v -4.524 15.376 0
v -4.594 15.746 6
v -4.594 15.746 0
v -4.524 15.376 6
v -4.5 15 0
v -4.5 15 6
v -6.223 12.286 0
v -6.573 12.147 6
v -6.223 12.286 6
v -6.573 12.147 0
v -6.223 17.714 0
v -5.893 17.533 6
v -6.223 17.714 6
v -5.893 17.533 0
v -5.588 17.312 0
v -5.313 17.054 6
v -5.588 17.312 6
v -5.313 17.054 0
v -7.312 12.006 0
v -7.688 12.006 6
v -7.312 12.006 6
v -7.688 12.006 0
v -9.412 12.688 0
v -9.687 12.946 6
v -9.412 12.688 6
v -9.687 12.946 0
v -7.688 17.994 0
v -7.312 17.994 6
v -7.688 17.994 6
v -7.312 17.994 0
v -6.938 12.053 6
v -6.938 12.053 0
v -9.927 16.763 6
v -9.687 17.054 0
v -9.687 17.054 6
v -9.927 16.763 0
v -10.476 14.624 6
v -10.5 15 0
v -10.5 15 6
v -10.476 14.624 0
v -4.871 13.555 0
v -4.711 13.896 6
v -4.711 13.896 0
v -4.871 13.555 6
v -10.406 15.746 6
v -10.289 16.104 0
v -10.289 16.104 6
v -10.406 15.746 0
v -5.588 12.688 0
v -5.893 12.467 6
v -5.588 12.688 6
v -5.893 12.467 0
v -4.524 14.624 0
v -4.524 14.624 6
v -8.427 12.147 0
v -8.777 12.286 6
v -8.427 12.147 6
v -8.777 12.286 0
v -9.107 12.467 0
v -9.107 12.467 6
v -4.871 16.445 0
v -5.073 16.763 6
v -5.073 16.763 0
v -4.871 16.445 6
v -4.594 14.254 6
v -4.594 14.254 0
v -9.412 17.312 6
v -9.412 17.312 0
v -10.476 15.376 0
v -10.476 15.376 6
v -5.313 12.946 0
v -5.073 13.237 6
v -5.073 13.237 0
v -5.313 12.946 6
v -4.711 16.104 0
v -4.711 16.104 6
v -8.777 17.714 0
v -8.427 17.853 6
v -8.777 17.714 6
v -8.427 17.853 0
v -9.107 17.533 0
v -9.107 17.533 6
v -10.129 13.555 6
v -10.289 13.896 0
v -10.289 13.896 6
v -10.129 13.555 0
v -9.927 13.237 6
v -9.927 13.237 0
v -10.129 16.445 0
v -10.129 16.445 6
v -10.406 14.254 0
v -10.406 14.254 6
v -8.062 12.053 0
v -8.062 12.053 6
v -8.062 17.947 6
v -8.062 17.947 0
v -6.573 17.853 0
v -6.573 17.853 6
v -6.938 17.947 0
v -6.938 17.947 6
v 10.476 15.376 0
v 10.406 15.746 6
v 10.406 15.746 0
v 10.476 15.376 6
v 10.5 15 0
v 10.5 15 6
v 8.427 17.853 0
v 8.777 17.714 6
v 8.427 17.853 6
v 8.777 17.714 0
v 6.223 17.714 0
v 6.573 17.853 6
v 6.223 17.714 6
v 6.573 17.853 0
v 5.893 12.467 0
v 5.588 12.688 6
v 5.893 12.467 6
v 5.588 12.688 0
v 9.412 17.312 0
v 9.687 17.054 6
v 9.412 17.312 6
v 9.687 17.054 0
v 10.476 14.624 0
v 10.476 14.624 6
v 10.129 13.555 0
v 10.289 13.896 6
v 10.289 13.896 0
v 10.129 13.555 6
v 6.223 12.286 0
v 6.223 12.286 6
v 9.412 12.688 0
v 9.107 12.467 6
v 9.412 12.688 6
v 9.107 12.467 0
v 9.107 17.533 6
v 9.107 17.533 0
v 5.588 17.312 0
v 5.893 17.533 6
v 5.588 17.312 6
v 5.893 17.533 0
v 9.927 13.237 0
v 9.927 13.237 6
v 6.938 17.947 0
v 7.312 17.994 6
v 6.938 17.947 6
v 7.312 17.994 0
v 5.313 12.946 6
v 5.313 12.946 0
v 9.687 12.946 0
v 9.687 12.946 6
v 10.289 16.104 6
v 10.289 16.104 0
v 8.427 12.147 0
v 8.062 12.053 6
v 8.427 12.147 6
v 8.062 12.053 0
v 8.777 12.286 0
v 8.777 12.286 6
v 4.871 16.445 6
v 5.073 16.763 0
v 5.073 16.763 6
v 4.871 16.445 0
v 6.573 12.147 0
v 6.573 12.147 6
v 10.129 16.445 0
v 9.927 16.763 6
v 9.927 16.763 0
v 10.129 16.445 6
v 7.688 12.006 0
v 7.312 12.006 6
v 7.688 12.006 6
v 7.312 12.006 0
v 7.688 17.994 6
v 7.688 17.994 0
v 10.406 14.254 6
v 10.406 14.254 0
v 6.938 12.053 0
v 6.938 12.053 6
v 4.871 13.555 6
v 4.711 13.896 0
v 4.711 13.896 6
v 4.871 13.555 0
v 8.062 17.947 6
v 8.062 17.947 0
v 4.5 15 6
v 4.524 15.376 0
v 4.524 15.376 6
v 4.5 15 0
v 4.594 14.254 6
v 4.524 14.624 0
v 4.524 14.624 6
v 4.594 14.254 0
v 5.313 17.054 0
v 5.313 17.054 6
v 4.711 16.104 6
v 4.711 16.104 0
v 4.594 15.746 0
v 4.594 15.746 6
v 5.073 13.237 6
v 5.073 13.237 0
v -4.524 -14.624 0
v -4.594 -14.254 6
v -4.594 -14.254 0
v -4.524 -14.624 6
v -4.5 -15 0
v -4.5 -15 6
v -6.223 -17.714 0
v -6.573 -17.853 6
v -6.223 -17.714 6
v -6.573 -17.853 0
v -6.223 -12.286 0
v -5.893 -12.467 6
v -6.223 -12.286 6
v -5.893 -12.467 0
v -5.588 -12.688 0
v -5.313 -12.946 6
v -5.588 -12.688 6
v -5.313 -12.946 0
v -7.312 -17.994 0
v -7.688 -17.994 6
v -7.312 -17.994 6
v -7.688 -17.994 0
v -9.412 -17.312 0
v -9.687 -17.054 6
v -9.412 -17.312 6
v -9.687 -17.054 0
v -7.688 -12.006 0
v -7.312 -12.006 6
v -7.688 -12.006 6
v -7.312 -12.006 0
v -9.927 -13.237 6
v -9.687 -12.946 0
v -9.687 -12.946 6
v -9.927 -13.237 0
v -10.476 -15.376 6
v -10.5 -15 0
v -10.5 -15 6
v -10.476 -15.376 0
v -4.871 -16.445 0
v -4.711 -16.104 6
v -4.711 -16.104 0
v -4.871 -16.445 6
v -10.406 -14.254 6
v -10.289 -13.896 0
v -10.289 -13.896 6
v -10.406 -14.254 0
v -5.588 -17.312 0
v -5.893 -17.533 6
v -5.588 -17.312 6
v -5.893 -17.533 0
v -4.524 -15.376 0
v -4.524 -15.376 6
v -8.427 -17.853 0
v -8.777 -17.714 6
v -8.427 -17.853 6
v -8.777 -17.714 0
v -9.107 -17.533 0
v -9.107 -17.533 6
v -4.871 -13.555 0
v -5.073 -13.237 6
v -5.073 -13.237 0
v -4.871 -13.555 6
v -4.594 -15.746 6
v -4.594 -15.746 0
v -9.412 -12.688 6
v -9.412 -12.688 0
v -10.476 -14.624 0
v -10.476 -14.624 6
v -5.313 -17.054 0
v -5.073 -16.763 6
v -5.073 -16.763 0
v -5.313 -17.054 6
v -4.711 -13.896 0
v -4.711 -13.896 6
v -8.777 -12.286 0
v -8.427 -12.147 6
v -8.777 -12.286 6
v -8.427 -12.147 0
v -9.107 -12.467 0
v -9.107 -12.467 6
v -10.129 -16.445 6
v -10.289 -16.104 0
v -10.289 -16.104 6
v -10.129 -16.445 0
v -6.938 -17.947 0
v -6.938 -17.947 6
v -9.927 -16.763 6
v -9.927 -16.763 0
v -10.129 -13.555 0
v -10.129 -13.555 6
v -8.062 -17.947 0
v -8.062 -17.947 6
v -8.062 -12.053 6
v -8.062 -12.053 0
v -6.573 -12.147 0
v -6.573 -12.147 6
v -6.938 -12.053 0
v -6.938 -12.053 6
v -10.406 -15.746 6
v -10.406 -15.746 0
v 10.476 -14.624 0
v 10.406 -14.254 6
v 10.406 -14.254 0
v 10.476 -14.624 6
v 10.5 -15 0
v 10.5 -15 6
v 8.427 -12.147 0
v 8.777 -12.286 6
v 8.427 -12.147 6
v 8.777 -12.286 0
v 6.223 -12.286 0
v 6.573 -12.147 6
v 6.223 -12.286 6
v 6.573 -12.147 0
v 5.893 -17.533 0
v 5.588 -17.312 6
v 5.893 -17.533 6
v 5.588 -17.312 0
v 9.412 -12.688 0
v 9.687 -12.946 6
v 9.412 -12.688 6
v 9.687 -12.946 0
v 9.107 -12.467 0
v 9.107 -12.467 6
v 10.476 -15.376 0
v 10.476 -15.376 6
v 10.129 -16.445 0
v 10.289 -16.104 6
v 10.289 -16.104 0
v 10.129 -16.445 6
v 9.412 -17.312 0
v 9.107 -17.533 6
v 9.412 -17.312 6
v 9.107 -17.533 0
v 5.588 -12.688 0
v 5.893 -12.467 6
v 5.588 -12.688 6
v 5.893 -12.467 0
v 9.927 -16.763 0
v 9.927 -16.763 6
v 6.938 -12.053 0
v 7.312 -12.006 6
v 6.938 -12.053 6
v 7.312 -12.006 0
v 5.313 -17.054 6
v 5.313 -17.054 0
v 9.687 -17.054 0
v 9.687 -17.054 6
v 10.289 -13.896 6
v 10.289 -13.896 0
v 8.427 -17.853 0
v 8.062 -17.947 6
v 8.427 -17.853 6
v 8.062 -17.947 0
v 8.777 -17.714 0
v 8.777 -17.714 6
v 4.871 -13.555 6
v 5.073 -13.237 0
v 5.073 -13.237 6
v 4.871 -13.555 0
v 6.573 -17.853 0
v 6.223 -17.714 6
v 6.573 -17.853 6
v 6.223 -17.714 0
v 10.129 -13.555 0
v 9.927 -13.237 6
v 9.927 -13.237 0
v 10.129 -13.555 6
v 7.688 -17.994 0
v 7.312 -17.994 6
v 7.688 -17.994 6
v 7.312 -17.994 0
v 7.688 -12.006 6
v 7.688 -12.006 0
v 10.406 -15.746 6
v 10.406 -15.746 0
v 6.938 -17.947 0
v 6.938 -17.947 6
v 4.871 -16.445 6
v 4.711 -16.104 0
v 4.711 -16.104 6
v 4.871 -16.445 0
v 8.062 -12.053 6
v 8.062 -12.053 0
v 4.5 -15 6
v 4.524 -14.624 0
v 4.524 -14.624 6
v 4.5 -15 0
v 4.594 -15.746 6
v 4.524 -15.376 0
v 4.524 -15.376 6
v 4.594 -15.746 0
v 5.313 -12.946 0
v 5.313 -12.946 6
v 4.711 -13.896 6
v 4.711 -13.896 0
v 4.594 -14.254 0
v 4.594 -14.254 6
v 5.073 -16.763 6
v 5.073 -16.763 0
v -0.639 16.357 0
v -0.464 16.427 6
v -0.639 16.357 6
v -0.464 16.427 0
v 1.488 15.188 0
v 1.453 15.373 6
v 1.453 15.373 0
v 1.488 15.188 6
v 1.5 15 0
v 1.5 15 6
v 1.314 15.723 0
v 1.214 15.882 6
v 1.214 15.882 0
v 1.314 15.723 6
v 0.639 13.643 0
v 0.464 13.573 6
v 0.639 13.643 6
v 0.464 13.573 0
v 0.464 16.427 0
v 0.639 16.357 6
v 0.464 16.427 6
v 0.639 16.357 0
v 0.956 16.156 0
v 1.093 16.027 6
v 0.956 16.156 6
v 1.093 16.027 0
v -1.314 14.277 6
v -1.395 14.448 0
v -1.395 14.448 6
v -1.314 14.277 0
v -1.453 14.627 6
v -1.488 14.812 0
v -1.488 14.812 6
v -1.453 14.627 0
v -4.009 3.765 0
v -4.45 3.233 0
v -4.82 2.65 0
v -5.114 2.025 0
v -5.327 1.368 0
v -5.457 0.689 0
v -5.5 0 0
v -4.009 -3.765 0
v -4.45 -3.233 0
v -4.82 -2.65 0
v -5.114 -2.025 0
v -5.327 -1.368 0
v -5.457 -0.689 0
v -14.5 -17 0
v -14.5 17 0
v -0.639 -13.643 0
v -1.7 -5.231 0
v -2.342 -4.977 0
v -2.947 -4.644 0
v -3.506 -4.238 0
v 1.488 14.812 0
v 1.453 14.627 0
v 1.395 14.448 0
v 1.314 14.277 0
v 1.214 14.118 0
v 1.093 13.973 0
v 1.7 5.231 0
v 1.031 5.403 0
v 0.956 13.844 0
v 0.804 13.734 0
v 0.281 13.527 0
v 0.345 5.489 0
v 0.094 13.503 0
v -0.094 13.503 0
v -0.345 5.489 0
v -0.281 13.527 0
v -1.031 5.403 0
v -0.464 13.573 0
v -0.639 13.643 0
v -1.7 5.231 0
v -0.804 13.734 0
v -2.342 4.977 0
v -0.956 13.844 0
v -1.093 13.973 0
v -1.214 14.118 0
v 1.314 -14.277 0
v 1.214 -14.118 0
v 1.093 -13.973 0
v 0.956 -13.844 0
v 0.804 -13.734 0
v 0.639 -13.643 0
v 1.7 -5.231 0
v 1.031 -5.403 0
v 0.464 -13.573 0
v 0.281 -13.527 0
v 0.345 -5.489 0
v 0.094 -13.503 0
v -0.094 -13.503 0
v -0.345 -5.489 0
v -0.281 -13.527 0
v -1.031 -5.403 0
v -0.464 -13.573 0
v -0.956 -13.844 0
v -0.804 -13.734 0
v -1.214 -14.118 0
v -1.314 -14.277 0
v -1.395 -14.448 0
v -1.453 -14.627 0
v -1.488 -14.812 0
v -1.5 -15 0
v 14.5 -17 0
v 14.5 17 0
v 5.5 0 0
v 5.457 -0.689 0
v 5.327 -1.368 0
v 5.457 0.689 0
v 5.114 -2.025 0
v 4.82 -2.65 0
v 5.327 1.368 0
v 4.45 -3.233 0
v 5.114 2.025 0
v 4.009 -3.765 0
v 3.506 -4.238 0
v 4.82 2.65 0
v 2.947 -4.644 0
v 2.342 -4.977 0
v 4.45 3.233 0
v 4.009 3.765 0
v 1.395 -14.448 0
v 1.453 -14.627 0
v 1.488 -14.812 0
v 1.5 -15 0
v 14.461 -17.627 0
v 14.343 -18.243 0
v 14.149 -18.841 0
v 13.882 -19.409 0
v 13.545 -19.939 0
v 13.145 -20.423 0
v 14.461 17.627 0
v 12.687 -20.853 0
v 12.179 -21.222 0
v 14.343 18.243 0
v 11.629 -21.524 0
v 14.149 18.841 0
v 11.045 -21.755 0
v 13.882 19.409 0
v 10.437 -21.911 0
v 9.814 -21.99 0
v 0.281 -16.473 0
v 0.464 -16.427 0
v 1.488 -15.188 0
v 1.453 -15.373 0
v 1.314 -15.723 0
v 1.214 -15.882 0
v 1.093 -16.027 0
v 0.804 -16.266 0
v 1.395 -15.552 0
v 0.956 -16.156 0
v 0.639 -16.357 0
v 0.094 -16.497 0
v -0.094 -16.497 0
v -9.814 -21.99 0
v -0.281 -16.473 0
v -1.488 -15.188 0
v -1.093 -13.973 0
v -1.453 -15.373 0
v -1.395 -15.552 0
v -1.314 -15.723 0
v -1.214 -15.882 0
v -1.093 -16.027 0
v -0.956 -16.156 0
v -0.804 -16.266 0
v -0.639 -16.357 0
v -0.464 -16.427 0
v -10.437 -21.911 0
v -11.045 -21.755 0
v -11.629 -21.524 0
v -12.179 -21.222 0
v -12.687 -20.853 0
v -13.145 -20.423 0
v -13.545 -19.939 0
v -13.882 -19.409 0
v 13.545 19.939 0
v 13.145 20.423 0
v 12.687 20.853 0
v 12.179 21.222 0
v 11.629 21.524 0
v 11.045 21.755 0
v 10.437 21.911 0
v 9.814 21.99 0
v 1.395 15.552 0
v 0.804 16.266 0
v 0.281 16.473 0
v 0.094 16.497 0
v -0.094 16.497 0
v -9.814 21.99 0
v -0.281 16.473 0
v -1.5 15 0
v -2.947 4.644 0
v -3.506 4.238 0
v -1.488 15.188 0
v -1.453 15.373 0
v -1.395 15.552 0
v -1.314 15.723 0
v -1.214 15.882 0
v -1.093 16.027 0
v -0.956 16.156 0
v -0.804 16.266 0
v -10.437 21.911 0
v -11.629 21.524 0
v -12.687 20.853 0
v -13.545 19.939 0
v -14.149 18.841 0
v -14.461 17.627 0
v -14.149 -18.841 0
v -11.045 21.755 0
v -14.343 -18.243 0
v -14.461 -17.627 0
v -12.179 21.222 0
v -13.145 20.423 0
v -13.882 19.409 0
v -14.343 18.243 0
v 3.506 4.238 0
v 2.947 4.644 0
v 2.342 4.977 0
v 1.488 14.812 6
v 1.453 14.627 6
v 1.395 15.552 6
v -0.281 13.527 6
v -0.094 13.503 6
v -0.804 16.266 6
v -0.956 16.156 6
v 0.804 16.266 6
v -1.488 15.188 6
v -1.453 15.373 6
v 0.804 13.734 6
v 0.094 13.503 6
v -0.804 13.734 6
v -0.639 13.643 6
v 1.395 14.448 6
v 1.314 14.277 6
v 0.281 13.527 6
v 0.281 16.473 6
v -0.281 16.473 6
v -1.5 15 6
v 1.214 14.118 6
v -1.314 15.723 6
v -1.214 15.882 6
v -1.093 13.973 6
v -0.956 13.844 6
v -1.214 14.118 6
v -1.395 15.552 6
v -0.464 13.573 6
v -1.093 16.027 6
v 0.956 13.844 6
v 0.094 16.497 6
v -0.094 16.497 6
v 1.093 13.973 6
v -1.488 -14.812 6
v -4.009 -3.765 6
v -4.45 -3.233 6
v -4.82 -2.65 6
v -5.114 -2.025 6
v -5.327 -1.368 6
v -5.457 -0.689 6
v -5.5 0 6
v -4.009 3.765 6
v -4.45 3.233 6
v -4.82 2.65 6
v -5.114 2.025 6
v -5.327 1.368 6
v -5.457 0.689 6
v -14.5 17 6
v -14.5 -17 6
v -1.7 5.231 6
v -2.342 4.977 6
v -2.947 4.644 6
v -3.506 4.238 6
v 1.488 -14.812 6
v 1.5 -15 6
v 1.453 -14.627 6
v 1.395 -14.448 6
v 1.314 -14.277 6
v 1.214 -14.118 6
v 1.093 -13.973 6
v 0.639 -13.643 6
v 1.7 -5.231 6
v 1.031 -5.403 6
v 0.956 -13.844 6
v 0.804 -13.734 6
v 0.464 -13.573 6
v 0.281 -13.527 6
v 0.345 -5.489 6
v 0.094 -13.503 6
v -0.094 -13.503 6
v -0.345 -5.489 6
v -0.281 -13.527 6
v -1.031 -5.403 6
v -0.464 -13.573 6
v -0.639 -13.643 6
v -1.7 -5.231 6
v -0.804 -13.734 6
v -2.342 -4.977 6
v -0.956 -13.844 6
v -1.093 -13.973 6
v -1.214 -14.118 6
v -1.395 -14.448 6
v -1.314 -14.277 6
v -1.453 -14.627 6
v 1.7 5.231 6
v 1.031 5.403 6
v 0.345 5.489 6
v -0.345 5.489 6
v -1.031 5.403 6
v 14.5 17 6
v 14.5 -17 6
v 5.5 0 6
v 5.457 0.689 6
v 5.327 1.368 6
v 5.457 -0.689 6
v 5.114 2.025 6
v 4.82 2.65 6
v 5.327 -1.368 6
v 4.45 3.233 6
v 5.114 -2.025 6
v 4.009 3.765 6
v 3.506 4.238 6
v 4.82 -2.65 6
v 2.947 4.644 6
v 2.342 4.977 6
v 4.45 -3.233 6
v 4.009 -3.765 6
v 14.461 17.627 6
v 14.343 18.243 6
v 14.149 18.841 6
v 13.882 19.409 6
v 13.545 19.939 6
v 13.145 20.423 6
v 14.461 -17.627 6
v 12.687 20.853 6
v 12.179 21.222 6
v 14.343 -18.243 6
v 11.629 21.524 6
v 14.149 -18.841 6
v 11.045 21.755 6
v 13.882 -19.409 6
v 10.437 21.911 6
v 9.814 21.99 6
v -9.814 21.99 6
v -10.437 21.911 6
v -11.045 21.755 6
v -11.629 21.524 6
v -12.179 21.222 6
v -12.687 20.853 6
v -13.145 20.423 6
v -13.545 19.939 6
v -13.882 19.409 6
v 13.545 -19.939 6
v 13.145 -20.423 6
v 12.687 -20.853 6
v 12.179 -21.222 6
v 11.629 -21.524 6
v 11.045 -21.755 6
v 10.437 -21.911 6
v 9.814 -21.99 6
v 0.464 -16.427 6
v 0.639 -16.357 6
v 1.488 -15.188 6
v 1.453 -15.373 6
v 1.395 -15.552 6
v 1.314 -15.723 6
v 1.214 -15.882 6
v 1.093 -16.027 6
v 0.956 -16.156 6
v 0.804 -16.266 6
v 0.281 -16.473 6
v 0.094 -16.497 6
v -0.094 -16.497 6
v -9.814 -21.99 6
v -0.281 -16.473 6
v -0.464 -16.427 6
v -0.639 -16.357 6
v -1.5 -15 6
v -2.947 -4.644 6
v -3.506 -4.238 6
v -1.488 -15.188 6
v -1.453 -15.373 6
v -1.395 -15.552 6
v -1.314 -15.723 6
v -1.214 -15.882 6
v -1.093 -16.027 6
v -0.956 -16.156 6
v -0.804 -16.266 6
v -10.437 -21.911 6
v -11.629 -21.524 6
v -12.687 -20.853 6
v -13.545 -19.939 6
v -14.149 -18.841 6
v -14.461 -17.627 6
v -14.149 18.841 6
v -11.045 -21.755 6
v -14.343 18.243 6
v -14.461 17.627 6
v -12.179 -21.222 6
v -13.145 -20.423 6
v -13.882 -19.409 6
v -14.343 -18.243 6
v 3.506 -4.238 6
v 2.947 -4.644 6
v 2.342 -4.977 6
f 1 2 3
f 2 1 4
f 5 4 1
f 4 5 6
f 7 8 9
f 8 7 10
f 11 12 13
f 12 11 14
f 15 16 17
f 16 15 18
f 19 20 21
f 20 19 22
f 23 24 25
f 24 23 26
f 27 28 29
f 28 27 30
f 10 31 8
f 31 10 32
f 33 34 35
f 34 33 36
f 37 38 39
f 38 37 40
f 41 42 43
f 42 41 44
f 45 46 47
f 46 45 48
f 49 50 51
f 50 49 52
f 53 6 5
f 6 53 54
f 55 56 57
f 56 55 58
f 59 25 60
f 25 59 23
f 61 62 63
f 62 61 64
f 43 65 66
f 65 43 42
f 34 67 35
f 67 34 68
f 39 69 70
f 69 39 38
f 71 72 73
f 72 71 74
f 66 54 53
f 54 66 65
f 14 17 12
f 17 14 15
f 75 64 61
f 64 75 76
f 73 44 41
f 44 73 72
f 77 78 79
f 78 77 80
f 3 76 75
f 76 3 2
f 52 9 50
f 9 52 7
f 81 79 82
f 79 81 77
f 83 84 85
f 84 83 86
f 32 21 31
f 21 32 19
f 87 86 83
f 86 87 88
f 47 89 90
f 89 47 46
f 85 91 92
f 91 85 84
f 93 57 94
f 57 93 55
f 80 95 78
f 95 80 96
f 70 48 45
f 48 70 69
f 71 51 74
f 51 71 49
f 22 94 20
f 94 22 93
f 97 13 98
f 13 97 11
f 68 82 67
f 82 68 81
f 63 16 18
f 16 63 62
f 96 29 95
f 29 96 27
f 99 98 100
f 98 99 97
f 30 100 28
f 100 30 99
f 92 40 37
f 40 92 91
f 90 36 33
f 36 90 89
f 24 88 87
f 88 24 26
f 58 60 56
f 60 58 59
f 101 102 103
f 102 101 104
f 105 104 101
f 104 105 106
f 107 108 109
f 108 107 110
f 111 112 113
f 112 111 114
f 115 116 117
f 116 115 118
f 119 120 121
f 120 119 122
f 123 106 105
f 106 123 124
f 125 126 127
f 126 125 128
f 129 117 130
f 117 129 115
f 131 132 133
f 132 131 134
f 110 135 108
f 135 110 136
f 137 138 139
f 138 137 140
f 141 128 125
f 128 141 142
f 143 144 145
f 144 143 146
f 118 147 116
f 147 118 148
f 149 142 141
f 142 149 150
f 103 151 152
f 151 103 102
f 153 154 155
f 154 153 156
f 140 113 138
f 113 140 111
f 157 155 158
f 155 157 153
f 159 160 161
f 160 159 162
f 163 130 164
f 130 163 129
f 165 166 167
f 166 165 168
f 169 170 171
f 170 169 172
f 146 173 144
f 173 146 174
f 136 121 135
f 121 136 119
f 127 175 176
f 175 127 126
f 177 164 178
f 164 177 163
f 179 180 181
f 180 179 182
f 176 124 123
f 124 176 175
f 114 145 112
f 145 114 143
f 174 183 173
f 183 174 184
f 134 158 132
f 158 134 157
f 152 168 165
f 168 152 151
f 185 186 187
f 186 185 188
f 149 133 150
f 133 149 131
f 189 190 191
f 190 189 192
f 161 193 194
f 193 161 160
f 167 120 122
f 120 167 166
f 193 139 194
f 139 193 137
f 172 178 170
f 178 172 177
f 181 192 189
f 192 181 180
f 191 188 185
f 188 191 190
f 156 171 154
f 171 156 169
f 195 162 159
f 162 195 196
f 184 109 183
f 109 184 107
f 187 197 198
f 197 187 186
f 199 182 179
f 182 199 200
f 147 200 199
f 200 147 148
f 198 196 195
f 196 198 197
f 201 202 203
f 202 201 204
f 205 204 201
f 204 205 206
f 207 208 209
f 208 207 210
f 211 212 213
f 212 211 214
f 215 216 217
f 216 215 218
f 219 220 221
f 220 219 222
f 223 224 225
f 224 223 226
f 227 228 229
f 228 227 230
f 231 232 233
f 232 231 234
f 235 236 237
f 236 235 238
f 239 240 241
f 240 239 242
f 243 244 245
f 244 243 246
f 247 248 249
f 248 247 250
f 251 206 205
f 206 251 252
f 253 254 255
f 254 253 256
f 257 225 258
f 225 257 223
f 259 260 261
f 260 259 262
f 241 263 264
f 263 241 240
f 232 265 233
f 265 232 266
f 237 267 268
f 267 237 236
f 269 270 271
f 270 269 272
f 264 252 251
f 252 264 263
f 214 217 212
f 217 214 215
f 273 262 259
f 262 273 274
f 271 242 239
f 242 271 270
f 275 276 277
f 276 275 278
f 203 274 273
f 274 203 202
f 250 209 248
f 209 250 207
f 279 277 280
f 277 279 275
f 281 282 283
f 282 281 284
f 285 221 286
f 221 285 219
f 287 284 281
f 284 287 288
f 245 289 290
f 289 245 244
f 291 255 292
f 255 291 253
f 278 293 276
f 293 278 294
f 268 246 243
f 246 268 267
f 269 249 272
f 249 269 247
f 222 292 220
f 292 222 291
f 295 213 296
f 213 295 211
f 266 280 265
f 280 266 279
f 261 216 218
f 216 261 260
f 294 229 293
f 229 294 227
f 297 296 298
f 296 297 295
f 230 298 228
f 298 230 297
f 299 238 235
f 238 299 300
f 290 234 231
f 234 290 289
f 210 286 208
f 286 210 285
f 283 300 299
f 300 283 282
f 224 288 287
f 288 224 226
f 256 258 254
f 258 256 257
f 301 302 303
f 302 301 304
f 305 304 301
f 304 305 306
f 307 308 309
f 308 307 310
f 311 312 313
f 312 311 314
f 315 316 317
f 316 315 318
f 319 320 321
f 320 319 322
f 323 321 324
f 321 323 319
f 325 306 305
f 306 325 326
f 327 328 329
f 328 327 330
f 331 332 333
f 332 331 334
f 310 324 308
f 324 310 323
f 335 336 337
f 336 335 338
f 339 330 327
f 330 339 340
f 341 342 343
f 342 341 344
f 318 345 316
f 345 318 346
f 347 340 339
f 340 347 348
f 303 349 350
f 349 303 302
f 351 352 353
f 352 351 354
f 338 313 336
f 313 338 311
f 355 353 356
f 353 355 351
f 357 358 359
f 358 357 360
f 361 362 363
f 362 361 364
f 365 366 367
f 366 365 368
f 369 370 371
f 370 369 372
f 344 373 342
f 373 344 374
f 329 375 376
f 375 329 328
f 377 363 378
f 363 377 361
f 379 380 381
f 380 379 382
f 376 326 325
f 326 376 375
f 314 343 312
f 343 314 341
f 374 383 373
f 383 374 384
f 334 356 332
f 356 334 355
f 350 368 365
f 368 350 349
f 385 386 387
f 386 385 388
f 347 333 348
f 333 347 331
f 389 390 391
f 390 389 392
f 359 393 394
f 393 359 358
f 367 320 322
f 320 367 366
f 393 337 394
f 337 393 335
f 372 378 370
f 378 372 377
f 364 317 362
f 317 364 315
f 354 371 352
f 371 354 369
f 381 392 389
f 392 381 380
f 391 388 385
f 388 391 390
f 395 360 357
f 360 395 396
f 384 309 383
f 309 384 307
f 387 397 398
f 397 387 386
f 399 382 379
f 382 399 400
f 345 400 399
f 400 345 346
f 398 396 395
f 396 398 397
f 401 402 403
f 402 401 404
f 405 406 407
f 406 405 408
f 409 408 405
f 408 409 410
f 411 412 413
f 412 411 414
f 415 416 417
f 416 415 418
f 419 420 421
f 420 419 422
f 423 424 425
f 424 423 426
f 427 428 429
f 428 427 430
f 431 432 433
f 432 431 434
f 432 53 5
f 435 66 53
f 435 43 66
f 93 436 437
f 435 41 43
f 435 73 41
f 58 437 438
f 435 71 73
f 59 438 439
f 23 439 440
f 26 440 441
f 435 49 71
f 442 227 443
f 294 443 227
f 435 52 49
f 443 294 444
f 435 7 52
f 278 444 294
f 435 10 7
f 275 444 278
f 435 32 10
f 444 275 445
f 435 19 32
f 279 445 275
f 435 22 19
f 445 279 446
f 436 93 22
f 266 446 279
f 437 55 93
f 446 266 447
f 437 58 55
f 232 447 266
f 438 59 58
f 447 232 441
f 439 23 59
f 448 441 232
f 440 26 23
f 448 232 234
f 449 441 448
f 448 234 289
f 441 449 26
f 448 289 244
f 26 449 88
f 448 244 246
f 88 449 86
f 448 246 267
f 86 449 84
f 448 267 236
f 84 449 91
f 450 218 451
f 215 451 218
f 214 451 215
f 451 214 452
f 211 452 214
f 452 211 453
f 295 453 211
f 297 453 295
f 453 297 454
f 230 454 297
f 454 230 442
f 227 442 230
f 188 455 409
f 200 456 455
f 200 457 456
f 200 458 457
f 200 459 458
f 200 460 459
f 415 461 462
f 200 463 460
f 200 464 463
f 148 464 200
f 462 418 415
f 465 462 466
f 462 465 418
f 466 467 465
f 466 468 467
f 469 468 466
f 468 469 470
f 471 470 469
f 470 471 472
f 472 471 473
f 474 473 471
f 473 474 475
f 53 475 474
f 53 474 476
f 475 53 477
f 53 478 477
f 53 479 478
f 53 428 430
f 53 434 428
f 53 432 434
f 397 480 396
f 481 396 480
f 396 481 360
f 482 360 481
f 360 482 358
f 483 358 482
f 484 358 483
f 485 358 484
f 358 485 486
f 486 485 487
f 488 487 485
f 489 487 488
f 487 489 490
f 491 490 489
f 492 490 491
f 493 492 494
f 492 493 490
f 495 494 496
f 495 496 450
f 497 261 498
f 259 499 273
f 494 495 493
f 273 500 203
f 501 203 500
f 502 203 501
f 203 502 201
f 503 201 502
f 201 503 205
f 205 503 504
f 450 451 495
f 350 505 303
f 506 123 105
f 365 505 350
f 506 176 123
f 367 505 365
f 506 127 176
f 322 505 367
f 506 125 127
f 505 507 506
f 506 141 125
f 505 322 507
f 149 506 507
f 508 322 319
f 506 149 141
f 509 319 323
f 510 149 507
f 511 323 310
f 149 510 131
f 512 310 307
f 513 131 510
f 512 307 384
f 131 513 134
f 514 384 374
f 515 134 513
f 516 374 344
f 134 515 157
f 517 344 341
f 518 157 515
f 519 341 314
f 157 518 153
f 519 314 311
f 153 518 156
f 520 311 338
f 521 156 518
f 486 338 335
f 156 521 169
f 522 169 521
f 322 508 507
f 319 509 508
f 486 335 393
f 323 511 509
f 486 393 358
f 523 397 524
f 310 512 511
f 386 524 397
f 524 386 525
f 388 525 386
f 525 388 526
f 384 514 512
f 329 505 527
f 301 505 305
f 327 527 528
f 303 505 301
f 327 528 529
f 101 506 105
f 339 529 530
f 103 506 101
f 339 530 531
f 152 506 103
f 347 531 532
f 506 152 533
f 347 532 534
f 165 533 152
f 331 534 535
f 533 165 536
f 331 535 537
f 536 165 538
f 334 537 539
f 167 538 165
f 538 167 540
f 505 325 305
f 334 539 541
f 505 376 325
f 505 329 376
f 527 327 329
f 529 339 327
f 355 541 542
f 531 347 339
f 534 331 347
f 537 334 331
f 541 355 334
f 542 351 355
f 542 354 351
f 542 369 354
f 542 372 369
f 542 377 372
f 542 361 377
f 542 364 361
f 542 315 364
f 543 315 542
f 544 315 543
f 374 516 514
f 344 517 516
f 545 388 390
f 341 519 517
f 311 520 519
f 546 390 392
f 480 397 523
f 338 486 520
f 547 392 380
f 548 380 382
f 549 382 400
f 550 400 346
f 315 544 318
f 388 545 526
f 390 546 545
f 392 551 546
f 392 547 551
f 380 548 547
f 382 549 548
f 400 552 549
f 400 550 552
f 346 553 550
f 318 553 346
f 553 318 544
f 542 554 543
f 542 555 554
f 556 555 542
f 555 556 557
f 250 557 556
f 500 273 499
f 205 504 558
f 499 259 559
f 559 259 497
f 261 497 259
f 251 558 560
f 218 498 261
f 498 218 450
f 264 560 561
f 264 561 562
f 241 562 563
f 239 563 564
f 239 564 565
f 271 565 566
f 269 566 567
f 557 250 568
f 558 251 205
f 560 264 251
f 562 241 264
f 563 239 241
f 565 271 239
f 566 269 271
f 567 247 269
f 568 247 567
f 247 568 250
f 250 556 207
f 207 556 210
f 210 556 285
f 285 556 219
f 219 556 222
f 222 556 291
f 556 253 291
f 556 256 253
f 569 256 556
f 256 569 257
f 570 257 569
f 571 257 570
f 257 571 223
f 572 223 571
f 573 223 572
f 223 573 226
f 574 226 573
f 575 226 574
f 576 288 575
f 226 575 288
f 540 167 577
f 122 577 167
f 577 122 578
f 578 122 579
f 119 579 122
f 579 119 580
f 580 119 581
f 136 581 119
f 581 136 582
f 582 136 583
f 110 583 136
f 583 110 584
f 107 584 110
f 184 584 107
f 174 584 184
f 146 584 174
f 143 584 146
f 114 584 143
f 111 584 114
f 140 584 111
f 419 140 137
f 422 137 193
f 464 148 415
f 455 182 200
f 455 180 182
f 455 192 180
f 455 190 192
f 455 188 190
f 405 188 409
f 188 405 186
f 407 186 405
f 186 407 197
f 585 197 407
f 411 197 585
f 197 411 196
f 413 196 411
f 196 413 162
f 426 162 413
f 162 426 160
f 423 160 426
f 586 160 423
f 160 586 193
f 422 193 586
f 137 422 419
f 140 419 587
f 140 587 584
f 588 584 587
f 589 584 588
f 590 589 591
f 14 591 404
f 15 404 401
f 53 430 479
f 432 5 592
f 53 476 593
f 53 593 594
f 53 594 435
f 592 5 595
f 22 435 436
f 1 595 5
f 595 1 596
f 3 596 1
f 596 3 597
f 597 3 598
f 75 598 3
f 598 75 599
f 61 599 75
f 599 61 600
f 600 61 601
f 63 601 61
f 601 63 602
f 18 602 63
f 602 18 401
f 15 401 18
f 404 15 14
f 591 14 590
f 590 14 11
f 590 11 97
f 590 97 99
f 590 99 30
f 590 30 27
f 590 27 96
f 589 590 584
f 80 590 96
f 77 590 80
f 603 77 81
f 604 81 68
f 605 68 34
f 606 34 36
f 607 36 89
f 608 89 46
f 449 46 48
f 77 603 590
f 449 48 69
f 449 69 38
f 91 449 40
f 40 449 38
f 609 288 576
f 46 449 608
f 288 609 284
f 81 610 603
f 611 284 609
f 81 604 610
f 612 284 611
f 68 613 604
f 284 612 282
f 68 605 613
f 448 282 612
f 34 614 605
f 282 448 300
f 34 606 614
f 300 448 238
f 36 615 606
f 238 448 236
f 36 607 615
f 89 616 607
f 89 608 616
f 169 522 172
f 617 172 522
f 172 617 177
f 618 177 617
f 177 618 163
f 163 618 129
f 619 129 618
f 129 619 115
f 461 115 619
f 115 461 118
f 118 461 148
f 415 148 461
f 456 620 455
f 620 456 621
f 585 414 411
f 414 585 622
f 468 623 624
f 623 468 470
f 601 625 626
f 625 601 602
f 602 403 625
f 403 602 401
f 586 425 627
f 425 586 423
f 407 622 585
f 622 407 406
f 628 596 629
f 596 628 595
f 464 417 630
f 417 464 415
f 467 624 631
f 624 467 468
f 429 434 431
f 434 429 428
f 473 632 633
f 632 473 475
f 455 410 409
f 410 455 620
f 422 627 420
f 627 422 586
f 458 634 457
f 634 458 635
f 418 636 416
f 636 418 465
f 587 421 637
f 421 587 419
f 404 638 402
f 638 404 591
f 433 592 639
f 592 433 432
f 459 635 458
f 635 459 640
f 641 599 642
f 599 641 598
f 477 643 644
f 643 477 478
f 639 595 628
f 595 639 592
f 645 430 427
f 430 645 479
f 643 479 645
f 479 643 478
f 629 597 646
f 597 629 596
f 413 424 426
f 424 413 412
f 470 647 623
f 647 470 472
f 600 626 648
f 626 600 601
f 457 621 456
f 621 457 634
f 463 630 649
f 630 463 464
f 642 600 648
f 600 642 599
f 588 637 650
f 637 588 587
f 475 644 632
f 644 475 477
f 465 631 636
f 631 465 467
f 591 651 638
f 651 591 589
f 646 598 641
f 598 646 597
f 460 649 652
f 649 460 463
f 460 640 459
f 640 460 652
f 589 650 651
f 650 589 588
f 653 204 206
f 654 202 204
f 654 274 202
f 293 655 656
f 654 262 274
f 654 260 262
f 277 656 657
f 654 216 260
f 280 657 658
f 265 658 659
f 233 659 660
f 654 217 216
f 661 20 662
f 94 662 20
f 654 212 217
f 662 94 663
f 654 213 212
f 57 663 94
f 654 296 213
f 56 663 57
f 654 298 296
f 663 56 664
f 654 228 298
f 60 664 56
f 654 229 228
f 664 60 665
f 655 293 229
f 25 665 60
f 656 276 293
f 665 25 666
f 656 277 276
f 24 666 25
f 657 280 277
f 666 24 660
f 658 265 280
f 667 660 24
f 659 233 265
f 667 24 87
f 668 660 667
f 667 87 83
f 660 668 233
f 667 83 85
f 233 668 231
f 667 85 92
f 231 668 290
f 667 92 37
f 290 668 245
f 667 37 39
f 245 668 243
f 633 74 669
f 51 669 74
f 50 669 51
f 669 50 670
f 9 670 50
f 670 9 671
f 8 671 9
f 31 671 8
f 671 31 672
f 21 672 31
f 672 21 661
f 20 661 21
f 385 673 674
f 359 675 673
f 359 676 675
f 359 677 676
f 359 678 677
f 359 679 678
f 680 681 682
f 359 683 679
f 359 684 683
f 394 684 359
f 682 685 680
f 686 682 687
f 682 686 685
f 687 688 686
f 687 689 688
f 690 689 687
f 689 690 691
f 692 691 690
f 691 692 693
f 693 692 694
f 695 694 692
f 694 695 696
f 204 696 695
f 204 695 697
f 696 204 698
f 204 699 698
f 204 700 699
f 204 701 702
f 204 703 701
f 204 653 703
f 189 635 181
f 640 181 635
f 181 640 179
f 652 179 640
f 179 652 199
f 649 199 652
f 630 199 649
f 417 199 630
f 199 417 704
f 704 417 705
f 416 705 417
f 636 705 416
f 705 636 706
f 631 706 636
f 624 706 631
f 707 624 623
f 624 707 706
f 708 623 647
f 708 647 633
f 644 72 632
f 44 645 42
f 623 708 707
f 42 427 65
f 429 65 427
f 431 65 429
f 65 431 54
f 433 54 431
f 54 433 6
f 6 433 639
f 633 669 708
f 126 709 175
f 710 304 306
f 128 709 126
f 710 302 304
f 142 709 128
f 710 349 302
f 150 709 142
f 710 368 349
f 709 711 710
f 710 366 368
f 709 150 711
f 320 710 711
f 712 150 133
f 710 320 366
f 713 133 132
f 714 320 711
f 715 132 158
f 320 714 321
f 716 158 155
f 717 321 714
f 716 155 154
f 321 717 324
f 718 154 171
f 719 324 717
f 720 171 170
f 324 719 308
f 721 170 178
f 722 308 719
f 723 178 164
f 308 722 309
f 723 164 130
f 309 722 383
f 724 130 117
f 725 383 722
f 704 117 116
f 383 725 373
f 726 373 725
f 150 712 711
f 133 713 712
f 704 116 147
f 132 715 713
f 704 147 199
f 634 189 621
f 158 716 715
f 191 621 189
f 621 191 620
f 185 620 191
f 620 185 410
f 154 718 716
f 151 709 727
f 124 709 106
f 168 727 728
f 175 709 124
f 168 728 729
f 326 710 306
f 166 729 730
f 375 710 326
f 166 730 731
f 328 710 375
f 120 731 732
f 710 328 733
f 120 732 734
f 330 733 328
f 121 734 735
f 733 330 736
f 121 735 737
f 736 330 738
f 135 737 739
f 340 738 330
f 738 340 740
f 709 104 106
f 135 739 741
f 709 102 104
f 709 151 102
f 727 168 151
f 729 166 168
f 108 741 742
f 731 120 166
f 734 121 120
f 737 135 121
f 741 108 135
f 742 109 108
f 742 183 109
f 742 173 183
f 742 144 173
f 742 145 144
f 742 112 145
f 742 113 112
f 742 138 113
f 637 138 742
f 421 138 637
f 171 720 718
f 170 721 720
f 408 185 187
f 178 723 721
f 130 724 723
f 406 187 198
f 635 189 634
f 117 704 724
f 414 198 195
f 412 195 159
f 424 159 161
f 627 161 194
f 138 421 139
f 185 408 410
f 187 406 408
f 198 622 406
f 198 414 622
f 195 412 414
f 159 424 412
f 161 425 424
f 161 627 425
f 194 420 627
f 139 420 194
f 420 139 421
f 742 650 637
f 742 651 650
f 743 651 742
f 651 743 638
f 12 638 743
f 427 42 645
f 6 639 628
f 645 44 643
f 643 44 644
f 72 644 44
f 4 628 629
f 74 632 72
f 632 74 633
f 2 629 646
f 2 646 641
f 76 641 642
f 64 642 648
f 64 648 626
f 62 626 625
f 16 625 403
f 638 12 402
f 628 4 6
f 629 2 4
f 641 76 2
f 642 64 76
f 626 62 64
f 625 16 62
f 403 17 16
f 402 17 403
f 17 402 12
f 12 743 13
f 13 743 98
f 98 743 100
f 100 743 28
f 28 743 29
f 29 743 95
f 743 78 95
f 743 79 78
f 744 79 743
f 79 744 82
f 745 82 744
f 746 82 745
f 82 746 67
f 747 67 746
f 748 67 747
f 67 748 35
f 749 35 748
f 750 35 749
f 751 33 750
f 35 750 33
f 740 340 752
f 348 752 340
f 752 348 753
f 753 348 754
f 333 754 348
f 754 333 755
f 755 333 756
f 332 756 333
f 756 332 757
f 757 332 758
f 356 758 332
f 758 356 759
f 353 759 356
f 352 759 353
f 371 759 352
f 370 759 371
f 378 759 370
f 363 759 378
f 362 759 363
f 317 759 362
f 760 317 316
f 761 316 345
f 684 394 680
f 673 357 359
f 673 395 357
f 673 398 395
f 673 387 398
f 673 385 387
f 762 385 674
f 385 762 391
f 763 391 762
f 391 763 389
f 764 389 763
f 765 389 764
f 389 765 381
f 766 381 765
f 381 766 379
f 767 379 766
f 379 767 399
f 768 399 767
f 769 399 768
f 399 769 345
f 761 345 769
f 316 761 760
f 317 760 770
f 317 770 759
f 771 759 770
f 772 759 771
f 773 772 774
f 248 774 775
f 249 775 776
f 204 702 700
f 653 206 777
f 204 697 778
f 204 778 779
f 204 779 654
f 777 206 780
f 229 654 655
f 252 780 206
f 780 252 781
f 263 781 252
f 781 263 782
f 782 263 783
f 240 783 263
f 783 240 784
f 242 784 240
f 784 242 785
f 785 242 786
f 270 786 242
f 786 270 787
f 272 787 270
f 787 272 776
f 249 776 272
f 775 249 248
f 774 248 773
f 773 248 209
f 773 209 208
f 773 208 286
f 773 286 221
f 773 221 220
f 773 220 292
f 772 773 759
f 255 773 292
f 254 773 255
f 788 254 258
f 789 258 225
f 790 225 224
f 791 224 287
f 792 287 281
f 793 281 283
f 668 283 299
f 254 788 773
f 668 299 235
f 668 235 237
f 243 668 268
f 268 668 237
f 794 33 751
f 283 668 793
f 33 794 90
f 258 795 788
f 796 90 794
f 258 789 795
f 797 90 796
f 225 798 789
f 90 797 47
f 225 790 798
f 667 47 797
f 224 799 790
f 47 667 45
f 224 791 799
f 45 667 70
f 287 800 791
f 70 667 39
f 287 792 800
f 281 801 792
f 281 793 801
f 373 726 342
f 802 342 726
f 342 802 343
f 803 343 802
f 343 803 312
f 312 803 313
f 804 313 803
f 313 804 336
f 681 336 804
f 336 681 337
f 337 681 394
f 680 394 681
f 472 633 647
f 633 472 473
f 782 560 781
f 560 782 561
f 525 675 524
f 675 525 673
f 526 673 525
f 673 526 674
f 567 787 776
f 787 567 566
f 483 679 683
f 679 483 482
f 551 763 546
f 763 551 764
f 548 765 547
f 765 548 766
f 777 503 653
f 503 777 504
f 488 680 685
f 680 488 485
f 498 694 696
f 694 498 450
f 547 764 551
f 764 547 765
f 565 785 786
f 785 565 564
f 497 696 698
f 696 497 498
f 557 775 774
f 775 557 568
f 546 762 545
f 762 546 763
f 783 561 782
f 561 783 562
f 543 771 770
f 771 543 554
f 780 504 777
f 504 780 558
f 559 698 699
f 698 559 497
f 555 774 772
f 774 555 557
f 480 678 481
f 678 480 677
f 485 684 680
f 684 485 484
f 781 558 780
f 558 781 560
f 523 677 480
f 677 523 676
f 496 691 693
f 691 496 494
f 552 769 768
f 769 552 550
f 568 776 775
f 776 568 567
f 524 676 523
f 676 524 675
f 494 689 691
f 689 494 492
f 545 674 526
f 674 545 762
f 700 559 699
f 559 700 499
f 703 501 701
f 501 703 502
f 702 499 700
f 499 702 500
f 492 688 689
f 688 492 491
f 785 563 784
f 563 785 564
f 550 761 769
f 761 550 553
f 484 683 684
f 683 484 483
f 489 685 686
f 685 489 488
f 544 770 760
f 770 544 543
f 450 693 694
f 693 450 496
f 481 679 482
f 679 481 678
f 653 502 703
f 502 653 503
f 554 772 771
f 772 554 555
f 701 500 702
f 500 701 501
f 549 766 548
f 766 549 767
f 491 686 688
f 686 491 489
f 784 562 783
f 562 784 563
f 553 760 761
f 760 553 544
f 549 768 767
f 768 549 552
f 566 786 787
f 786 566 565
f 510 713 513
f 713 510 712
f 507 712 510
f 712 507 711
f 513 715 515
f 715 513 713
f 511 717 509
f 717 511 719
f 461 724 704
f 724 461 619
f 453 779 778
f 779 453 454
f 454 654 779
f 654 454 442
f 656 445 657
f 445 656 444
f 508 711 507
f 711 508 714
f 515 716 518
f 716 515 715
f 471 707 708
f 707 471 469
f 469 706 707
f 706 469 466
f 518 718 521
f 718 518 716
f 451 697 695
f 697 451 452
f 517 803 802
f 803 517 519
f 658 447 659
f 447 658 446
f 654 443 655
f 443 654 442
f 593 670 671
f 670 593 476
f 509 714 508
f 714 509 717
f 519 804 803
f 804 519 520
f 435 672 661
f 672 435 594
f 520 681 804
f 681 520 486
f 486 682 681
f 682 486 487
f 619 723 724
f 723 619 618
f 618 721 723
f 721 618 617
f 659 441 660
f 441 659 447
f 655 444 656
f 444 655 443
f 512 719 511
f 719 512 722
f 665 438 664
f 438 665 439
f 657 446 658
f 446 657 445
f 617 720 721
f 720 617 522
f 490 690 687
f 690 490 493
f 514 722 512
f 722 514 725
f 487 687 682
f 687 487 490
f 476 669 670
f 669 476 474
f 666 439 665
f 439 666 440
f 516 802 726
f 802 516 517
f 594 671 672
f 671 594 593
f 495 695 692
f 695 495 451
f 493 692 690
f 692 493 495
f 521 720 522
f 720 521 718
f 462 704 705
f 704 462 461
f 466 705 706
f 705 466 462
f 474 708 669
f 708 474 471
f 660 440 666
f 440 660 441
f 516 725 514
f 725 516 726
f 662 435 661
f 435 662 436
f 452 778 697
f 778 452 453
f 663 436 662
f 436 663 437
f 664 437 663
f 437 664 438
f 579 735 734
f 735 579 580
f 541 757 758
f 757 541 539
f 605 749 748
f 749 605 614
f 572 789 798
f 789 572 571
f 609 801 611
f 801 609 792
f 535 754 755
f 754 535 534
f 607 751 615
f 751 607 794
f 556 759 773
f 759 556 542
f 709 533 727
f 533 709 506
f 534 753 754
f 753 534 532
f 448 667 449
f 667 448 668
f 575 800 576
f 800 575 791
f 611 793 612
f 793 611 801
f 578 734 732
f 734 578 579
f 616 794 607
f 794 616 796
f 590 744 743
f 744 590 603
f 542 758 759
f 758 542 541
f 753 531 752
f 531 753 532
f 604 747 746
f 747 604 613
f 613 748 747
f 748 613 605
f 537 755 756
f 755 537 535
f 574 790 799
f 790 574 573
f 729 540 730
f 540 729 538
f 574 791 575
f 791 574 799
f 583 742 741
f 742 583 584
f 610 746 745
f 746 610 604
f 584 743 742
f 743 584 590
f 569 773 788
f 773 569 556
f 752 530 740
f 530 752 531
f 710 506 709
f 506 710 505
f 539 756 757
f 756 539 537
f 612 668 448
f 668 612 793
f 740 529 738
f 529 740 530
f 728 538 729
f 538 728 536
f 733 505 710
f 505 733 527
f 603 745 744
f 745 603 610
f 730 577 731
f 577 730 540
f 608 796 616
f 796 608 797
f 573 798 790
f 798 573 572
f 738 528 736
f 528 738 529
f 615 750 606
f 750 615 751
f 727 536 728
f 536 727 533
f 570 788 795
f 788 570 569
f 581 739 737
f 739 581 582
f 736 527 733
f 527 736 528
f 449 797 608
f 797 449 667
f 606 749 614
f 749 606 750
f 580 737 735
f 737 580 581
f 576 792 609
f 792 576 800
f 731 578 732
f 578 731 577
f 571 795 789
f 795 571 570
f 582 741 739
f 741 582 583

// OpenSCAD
$fn = 50;


difference() {
	union() {
		hull() {
			translate(v = [-9.5000000000, 17.0000000000, 0]) {
				cylinder(h = 6, r = 5);
			}
			translate(v = [9.5000000000, 17.0000000000, 0]) {
				cylinder(h = 6, r = 5);
			}
			translate(v = [-9.5000000000, -17.0000000000, 0]) {
				cylinder(h = 6, r = 5);
			}
			translate(v = [9.5000000000, -17.0000000000, 0]) {
				cylinder(h = 6, r = 5);
			}
		}
	}
	union() {
		#translate(v = [-7.5000000000, 15.0000000000, 0]) {
			cylinder(h = 6, r = 3.0000000000);
		}
		#translate(v = [7.5000000000, 15.0000000000, 0]) {
			cylinder(h = 6, r = 3.0000000000);
		}
		#translate(v = [-7.5000000000, -15.0000000000, 0]) {
			cylinder(h = 6, r = 3.0000000000);
		}
		#translate(v = [7.5000000000, -15.0000000000, 0]) {
			cylinder(h = 6, r = 3.0000000000);
		}
		#translate(v = [-7.5000000000, -15.0000000000, -100.0000000000]) {
			cylinder(h = 200, r = 3.0000000000);
		}
		#translate(v = [-7.5000000000, 15.0000000000, -100.0000000000]) {
			cylinder(h = 200, r = 3.0000000000);
		}
		#translate(v = [7.5000000000, -15.0000000000, -100.0000000000]) {
			cylinder(h = 200, r = 3.0000000000);
		}
		#translate(v = [7.5000000000, 15.0000000000, -100.0000000000]) {
			cylinder(h = 200, r = 3.0000000000);
		}
		#translate(v = [-7.5000000000, 15.0000000000, 0]) {
			cylinder(h = 6, r = 1.5000000000);
		}
		#translate(v = [0.0000000000, 15.0000000000, 0]) {
			cylinder(h = 6, r = 1.5000000000);
		}
		#translate(v = [7.5000000000, 15.0000000000, 0]) {
			cylinder(h = 6, r = 1.5000000000);
		}
		#translate(v = [-7.5000000000, -15.0000000000, 0]) {
			cylinder(h = 6, r = 1.5000000000);
		}
		#translate(v = [0.0000000000, -15.0000000000, 0]) {
			cylinder(h = 6, r = 1.5000000000);
		}
		#translate(v = [7.5000000000, -15.0000000000, 0]) {
			cylinder(h = 6, r = 1.5000000000);
		}
		#translate(v = [-7.5000000000, 15.0000000000, 0]) {
			cylinder(h = 6, r = 1.5000000000);
		}
		#translate(v = [0.0000000000, 15.0000000000, 0]) {
			cylinder(h = 6, r = 1.5000000000);
		}
		#translate(v = [7.5000000000, 15.0000000000, 0]) {
			cylinder(h = 6, r = 1.5000000000);
		}
		#translate(v = [-7.5000000000, -15.0000000000, 0]) {
			cylinder(h = 6, r = 1.5000000000);
		}
		#translate(v = [0.0000000000, -15.0000000000, 0]) {
			cylinder(h = 6, r = 1.5000000000);
		}
		#translate(v = [7.5000000000, -15.0000000000, 0]) {
			cylinder(h = 6, r = 1.5000000000);
		}
		#translate(v = [-7.5000000000, 15.0000000000, 0]) {
			cylinder(h = 6, r = 1.5000000000);
		}
		#translate(v = [0.0000000000, 15.0000000000, 0]) {
			cylinder(h = 6, r = 1.5000000000);
		}
		#translate(v = [7.5000000000, 15.0000000000, 0]) {
			cylinder(h = 6, r = 1.5000000000);
		}
		#translate(v = [-7.5000000000, -15.0000000000, 0]) {
			cylinder(h = 6, r = 1.5000000000);
		}
		#translate(v = [0.0000000000, -15.0000000000, 0]) {
			cylinder(h = 6, r = 1.5000000000);
		}
		#translate(v = [7.5000000000, -15.0000000000, 0]) {
			cylinder(h = 6, r = 1.5000000000);
		}
		#cylinder(h = 6, r = 5.5000000000);
	}
}
